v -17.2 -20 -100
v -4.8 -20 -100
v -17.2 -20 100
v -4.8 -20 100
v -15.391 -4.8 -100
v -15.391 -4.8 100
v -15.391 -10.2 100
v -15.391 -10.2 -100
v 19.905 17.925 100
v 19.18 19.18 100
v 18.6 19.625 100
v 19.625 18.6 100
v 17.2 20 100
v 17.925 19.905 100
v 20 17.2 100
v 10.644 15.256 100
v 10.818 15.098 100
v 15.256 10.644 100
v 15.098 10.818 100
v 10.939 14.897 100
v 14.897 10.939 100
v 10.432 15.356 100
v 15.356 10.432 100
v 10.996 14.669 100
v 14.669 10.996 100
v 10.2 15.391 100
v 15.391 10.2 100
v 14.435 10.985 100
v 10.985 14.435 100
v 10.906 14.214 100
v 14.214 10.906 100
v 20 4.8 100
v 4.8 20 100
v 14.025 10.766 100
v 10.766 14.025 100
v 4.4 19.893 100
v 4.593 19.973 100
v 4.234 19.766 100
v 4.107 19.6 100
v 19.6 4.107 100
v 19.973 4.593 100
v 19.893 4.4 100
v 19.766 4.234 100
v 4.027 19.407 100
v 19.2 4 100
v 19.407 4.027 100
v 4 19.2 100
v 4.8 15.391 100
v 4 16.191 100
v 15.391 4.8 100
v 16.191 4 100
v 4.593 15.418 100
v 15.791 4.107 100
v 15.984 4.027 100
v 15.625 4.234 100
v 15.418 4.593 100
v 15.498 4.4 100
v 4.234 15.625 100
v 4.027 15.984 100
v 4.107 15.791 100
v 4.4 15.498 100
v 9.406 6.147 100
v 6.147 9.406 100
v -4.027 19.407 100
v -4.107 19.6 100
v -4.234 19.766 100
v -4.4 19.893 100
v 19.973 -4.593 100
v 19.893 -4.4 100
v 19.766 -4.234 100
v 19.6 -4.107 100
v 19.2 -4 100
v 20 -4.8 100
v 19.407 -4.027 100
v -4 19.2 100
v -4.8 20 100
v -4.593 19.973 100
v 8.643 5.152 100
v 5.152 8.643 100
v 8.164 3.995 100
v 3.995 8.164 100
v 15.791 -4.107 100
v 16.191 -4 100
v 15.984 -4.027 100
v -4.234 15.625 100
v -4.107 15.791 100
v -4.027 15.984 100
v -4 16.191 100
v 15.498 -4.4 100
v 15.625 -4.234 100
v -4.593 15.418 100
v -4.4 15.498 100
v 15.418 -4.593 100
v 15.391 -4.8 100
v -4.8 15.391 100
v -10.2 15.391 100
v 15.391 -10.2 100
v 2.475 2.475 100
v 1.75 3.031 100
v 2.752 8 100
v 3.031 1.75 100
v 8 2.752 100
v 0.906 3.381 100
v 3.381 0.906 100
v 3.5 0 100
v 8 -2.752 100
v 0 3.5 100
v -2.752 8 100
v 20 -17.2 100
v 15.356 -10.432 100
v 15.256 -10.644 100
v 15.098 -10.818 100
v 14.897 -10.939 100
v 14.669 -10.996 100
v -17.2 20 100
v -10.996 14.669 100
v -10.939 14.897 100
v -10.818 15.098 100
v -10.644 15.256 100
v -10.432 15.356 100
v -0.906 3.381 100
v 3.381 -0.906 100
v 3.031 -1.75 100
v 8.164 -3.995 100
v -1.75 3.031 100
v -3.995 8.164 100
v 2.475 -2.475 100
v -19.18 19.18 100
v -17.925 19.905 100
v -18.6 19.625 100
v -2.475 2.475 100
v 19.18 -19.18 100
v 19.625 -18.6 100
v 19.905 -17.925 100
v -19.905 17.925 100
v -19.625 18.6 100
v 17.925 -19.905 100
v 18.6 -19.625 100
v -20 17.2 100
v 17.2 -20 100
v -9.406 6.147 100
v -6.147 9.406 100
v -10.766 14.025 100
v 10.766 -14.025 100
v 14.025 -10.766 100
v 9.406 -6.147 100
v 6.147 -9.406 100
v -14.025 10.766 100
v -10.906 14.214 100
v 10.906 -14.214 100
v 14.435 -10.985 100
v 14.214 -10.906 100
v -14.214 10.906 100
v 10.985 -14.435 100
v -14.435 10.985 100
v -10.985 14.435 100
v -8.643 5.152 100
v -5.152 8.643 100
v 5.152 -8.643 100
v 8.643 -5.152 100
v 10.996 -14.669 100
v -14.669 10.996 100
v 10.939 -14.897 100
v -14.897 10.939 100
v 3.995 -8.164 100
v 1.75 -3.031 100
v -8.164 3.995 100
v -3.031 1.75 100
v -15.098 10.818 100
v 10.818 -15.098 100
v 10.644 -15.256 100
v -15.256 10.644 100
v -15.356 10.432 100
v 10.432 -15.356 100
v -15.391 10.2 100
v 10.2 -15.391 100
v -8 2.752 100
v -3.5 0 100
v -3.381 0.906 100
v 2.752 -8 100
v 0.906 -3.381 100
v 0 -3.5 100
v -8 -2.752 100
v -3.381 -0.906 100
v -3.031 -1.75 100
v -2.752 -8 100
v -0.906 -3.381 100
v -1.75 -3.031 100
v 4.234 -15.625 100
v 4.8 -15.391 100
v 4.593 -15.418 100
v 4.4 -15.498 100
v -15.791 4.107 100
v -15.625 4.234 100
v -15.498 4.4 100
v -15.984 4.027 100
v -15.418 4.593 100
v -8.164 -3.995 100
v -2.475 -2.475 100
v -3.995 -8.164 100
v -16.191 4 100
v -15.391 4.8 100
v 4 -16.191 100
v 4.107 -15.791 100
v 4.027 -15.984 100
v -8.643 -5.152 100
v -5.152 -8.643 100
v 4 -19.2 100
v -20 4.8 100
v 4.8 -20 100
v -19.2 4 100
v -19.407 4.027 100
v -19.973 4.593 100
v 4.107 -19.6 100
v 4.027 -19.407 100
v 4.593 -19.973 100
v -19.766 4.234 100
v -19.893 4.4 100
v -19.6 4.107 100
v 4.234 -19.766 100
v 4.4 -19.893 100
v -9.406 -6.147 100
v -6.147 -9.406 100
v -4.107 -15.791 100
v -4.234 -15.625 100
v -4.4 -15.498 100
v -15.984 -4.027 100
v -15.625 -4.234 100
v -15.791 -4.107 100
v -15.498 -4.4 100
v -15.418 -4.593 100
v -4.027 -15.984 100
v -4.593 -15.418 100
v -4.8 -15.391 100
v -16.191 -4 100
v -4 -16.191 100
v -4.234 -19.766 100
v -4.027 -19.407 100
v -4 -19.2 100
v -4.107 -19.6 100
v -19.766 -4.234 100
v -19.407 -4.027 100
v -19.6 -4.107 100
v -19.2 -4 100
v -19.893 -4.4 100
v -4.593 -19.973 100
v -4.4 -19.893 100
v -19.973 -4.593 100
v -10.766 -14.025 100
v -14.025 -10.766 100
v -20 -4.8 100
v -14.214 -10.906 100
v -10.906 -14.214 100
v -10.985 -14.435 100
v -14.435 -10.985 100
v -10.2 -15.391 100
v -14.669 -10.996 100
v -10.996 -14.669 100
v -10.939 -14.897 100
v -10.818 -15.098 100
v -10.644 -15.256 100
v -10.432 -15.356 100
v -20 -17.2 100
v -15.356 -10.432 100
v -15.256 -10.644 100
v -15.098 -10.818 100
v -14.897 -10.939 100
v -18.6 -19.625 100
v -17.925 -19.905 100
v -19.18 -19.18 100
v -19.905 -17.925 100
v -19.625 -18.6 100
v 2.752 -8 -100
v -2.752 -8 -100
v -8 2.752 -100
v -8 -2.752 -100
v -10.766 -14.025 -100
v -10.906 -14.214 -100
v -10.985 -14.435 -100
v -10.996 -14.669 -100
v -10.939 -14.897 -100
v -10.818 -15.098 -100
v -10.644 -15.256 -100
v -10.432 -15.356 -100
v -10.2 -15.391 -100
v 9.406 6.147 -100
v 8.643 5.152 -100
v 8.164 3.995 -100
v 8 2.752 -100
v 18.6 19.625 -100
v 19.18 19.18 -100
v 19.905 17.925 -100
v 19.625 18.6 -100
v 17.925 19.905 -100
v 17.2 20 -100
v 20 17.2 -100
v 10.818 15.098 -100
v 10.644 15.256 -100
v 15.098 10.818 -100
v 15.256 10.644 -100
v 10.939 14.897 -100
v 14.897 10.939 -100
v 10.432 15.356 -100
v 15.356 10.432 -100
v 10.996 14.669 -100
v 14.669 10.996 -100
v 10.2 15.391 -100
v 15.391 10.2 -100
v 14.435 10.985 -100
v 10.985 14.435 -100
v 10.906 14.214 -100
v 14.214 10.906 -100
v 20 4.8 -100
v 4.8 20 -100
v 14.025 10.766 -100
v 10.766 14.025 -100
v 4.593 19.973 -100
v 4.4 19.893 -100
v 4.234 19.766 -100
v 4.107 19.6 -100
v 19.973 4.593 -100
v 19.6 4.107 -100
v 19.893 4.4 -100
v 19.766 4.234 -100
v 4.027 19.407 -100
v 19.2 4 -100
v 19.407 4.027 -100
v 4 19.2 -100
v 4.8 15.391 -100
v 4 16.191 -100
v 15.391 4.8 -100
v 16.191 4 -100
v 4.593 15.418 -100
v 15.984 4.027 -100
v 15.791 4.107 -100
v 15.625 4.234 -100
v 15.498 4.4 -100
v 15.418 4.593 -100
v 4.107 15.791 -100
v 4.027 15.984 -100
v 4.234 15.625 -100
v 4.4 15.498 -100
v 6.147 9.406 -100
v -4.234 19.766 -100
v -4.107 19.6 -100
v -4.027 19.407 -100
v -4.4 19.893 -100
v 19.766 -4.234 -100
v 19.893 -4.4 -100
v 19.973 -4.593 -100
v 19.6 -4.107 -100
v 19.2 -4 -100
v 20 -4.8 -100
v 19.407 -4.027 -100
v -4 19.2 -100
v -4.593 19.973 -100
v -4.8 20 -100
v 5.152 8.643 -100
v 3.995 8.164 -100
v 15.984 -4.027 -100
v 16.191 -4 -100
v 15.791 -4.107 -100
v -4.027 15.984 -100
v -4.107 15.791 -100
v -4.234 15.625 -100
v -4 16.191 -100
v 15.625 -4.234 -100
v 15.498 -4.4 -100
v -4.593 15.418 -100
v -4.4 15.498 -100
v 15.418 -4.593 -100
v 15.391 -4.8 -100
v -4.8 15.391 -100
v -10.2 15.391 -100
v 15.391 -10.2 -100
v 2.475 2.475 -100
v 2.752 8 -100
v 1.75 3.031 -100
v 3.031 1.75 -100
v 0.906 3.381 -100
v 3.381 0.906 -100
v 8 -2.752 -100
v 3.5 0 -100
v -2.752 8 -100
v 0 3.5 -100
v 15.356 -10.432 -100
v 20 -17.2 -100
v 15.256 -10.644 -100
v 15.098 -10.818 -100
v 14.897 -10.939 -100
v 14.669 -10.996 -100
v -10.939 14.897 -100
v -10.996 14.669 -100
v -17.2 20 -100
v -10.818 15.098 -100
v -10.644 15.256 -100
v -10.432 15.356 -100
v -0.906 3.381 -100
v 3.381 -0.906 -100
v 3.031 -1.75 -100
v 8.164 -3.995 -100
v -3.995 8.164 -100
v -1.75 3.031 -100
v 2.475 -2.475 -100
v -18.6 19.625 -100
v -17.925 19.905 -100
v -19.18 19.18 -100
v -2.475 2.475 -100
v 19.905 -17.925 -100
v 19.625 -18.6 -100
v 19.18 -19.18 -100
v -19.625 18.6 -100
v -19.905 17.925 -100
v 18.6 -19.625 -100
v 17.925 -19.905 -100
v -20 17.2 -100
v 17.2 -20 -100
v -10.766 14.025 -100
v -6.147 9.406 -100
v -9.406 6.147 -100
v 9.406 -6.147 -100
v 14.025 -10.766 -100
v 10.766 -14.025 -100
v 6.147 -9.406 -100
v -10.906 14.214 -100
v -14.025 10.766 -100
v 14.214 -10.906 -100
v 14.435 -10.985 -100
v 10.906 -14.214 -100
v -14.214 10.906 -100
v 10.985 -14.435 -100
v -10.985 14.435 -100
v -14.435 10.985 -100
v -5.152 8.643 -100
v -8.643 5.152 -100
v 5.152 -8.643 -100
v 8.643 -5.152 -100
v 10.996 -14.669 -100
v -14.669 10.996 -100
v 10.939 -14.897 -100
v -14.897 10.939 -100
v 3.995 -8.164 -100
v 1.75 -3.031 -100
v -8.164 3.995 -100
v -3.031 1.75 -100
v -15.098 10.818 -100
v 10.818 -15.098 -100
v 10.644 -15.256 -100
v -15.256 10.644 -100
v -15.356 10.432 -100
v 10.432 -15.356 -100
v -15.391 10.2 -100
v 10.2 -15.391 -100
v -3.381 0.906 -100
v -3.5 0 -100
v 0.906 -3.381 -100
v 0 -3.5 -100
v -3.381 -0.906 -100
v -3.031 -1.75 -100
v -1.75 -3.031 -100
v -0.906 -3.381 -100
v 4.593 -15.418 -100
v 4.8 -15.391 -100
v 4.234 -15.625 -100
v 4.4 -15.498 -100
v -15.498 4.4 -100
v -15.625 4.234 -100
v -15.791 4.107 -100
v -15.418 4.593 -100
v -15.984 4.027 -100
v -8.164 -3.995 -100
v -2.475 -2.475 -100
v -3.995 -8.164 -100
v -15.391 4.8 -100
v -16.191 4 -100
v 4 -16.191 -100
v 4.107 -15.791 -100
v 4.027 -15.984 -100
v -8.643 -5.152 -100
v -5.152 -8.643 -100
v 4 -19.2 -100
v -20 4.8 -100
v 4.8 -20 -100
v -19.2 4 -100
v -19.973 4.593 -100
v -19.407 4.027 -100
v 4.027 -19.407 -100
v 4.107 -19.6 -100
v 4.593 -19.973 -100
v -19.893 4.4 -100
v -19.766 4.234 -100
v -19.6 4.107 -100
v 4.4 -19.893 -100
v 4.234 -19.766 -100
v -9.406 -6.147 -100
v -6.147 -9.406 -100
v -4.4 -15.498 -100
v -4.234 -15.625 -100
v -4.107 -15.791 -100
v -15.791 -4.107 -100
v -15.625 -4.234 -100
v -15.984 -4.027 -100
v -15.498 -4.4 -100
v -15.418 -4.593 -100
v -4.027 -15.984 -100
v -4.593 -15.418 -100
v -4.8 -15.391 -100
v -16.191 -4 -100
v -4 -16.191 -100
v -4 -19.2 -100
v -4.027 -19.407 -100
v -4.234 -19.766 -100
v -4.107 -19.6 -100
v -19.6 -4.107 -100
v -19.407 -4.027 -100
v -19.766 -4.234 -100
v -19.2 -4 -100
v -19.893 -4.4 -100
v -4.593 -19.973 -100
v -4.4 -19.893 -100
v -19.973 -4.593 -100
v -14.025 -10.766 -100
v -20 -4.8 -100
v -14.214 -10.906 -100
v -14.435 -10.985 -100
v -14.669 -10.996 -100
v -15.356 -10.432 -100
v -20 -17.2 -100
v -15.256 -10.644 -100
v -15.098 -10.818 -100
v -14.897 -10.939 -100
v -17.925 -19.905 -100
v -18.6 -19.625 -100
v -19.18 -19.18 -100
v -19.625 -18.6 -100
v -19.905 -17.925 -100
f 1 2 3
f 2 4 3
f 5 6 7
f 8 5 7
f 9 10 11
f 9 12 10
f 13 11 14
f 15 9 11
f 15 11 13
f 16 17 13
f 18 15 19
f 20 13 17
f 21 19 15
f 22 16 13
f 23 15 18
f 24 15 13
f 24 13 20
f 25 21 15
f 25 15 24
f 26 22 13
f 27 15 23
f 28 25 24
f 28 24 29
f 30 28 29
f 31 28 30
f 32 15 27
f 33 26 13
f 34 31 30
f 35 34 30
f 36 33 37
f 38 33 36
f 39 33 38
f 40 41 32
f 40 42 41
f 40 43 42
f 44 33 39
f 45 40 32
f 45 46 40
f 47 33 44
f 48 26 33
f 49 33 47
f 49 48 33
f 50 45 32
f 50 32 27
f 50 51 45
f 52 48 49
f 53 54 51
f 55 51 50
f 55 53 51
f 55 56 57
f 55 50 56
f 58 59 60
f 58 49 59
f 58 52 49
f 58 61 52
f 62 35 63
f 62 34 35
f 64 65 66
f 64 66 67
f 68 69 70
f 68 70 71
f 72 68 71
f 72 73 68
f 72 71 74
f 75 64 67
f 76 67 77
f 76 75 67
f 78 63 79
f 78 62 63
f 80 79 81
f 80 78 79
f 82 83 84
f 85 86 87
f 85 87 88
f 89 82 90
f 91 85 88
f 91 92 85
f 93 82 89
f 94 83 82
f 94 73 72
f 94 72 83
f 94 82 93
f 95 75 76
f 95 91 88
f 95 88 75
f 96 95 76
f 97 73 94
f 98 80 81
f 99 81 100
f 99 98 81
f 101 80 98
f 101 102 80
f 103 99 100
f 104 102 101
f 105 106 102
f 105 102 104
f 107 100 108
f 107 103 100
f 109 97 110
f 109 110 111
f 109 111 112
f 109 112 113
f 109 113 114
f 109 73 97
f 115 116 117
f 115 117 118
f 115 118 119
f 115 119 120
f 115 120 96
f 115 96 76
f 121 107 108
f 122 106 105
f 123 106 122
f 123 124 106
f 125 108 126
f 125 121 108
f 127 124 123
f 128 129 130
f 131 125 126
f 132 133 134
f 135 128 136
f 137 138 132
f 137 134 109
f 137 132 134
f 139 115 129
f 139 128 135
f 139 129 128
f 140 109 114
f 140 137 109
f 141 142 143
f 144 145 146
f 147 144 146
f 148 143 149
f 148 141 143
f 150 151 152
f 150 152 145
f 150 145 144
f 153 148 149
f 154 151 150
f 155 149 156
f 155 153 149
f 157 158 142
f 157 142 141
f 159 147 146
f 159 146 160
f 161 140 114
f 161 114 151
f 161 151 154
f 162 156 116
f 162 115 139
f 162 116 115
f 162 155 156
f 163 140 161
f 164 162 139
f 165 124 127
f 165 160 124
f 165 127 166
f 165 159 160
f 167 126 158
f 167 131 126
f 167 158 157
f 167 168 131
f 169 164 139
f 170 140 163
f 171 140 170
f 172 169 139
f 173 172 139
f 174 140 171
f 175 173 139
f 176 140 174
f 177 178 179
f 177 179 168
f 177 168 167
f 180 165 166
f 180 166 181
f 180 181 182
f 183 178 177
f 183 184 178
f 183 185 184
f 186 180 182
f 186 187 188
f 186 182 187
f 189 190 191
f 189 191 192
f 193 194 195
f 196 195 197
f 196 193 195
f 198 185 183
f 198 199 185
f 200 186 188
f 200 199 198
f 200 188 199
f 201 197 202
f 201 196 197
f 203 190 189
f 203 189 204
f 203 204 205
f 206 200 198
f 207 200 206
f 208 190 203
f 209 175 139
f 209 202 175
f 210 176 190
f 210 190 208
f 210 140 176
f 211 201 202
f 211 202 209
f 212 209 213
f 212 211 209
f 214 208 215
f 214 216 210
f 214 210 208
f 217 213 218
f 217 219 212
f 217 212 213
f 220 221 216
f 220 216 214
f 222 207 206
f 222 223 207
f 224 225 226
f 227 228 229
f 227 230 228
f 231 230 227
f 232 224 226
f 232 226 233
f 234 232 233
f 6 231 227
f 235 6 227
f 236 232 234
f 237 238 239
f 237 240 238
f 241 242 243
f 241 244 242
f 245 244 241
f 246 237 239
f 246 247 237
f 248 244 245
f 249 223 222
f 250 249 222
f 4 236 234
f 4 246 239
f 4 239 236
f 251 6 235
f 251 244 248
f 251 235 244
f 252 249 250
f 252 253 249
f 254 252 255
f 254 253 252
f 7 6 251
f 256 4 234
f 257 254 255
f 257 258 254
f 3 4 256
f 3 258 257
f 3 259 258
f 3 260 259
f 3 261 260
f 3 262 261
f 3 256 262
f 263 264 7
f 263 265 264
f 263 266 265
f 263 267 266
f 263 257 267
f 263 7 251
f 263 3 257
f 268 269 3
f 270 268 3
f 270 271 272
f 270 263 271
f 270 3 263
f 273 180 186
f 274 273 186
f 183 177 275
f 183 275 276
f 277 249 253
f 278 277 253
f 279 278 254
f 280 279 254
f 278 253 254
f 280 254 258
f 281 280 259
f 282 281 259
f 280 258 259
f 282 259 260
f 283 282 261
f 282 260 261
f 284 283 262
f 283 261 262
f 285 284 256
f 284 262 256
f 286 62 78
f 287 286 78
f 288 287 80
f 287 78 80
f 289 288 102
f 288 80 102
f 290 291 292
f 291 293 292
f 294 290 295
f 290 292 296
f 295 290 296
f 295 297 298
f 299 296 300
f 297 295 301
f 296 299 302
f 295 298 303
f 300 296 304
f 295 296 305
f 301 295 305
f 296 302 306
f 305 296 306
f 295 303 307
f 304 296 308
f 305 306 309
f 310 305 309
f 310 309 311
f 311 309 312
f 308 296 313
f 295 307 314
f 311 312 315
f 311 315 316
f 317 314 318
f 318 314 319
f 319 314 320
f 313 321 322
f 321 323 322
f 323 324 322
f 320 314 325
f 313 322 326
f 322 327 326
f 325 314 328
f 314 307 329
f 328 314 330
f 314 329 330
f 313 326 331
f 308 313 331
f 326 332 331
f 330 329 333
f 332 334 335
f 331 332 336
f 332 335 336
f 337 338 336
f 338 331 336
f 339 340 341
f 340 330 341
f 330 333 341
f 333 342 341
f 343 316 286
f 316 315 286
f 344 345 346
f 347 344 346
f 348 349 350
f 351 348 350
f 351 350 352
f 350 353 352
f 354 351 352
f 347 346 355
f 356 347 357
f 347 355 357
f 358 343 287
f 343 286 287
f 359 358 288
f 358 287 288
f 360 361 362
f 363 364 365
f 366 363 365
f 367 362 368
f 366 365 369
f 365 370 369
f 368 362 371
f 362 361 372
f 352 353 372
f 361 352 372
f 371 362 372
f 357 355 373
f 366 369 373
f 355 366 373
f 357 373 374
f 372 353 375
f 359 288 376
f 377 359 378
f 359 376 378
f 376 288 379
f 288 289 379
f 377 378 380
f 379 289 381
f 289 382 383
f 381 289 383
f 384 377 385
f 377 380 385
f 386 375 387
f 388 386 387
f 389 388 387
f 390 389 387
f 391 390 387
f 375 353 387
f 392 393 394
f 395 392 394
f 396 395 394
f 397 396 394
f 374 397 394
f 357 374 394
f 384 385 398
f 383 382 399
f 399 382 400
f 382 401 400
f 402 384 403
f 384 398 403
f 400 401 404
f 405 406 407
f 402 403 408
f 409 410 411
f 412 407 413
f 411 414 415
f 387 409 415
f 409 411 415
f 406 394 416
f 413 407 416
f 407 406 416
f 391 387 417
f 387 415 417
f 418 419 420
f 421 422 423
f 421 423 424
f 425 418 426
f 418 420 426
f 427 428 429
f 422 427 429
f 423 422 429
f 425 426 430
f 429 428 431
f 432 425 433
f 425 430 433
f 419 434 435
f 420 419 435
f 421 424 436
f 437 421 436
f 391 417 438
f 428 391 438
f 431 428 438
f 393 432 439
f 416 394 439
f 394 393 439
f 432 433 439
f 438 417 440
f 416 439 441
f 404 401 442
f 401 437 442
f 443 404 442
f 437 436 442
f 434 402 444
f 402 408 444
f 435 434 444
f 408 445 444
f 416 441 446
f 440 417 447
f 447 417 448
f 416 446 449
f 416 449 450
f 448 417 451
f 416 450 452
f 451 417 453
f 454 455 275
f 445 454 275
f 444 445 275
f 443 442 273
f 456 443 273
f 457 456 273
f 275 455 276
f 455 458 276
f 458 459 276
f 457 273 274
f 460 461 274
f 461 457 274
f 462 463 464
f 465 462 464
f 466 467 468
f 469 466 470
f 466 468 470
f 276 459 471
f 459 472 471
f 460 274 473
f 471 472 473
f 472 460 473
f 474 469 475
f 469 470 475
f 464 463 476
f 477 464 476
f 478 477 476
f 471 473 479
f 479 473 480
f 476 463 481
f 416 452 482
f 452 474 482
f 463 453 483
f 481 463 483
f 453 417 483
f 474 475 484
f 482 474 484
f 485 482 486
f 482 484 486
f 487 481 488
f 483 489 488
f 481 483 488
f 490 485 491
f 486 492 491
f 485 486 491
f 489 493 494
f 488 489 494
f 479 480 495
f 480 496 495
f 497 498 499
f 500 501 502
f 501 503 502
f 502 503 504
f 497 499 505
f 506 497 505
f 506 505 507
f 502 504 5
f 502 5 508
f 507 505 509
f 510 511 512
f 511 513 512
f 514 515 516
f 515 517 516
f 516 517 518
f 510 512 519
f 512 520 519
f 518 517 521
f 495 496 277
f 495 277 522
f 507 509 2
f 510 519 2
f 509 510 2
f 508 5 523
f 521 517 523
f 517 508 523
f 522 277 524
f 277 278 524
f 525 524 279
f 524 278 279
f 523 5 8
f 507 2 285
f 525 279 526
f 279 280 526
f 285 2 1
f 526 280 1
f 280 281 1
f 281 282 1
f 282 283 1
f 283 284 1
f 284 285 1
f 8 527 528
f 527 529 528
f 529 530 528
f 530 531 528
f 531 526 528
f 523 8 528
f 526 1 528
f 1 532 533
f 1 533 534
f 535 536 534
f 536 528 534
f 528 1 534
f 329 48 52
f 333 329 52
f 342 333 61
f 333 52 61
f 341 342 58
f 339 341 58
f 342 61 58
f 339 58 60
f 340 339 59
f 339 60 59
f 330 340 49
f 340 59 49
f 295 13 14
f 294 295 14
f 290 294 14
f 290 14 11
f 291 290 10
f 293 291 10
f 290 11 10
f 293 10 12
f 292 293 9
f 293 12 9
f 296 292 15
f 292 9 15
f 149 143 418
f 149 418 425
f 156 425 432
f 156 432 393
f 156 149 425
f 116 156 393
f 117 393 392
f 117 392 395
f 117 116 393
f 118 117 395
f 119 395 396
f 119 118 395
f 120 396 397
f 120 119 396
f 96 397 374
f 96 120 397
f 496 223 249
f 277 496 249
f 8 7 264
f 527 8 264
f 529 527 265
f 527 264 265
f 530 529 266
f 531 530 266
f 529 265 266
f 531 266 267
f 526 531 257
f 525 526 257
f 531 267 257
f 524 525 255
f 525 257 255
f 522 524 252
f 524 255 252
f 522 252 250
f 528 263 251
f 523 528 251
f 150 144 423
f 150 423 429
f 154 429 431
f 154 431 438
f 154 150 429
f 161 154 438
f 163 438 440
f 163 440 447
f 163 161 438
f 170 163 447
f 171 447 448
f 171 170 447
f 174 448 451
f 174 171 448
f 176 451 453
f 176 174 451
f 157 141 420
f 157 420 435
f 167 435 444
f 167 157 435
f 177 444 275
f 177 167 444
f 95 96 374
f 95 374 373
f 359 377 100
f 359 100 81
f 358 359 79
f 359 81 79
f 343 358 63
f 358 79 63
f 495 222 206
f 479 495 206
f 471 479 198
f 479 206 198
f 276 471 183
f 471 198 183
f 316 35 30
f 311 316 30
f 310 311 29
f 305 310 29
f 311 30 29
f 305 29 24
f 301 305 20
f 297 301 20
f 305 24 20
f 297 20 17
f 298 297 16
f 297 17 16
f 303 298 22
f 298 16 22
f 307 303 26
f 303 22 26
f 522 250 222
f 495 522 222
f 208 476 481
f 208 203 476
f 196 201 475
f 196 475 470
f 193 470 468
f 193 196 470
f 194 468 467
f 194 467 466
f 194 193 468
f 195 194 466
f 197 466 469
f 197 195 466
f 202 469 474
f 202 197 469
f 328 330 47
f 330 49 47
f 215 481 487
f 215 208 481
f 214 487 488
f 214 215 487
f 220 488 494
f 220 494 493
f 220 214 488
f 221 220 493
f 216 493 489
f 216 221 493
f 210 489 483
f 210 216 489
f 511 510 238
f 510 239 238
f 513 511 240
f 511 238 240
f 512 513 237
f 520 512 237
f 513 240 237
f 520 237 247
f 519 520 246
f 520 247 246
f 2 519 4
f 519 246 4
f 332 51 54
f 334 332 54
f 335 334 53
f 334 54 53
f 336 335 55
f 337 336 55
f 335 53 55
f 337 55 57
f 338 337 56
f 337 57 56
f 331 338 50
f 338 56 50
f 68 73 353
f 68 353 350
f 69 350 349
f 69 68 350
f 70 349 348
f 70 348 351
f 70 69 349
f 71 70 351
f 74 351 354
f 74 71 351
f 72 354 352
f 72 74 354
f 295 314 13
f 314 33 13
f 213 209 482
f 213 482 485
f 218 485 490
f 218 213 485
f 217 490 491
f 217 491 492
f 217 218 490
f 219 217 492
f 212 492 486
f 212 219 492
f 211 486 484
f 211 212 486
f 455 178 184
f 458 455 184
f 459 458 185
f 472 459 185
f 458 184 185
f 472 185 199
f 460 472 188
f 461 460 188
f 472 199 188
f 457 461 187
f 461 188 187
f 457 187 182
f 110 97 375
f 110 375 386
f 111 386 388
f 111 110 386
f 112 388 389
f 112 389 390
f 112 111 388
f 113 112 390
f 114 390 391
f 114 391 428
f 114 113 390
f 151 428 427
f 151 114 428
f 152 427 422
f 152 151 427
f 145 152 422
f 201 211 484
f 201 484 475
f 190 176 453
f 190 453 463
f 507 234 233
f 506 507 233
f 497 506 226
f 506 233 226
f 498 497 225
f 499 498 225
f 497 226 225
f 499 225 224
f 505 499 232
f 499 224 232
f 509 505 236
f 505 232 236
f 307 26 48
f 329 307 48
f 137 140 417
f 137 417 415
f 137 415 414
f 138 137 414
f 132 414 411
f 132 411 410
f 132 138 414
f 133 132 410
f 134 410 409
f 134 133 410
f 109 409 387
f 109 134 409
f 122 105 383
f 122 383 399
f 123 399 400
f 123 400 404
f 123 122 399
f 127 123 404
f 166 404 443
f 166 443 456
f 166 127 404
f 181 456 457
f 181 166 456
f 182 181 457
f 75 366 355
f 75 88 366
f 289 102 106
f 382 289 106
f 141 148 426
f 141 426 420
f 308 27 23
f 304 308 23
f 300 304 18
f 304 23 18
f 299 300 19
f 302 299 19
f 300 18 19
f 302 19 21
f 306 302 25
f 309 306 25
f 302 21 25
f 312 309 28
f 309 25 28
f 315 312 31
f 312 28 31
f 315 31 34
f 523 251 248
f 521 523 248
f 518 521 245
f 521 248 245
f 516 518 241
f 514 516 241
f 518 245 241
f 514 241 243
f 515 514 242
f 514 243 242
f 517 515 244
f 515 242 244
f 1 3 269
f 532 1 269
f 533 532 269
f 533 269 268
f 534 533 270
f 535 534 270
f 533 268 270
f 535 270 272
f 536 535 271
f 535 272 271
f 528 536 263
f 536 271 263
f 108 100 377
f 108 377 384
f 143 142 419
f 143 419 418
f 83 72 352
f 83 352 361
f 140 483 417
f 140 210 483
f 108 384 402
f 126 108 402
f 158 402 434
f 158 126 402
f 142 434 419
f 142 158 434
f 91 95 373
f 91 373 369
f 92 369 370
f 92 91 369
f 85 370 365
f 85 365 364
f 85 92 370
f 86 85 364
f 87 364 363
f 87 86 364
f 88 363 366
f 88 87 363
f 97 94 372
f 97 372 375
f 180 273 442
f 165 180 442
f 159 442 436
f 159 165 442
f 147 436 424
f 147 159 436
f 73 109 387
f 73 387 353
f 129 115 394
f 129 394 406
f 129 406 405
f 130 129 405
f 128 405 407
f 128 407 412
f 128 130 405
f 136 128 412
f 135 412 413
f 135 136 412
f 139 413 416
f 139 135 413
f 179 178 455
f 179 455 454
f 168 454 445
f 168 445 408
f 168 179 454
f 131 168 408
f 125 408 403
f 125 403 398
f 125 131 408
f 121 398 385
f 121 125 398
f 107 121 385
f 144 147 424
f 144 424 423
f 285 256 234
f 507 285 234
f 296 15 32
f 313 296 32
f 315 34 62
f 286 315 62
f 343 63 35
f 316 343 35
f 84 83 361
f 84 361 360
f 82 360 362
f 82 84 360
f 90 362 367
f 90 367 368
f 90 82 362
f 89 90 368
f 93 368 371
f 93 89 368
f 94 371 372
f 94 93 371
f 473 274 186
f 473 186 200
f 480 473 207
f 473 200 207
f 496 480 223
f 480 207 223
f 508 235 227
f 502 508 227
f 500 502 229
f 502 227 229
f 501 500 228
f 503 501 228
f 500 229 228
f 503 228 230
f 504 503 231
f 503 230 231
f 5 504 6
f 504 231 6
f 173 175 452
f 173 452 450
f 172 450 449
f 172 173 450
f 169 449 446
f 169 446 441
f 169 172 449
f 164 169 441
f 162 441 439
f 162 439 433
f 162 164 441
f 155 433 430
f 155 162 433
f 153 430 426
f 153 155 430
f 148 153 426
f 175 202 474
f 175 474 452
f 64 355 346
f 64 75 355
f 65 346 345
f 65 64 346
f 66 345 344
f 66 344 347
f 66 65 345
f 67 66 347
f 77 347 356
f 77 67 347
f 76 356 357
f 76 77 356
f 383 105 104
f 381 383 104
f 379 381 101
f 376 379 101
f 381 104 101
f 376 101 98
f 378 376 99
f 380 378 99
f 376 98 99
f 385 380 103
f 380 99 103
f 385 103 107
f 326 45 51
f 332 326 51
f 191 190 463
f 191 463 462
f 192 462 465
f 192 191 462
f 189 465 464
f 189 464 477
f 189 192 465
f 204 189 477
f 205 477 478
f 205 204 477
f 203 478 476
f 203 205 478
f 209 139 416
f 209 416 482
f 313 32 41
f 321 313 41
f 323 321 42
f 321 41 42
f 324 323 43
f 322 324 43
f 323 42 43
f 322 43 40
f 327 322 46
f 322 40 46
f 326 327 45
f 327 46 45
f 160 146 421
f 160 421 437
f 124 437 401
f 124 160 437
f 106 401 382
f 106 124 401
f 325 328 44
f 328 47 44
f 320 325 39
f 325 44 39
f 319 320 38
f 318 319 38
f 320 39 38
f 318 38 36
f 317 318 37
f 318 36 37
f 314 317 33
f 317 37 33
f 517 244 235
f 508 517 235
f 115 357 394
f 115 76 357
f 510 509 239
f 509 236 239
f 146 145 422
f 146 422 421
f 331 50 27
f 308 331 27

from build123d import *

# Parameters (mm, degrees)
BOSS_EXTRUDE1_DEPTH = 100


with BuildPart() as part:
    # Sketch4 → Boss-Extrude1 (new body, symmetric)
    with BuildSketch(Plane.XY):
        with BuildLine():
            Line((4.8, -20), (17.2, -20))
            ThreePointArc((17.2, -20), (19.179898987, -19.179898987), (20, -17.2))
            Line((20, -17.2), (20, -4.8))
            ThreePointArc((20, -4.8), (19.765685425, -4.234314575), (19.2, -4))
            Line((19.2, -4), (16.190663761, -4))
            ThreePointArc((16.190663761, -4), (15.624978336, -4.234314575), (15.390663761, -4.8))
            Line((15.390663761, -4.8), (15.390663761, -10.2))
            ThreePointArc((15.390663761, -10.2), (14.896810507, -10.939103626), (14.024978336, -10.765685425))
            Line((14.024978336, -10.765685425), (9.40588745, -6.146594539))
            ThreePointArc((9.40588745, -6.146594539), (8.365378244, -4.589362465), (8, -2.752481989))
            Line((8, -2.752481989), (8, 0))
            Line((8, 0), (3.5, 0))
            ThreePointArc((3.5, 0), (2.474873734, -2.474873734), (0, -3.5))
            Line((0, -3.5), (0, -8))
            Line((0, -8), (2.752481989, -8))
            ThreePointArc((2.752481989, -8), (4.589362465, -8.365378244), (6.146594539, -9.40588745))
            Line((6.146594539, -9.40588745), (10.765685425, -14.024978336))
            ThreePointArc((10.765685425, -14.024978336), (10.939103626, -14.896810507), (10.2, -15.390663761))
            Line((10.2, -15.390663761), (4.8, -15.390663761))
            ThreePointArc((4.8, -15.390663761), (4.234314575, -15.624978336), (4, -16.190663761))
            Line((4, -16.190663761), (4, -19.2))
            ThreePointArc((4, -19.2), (4.234314575, -19.765685425), (4.8, -20))
        make_face()
    extrude(amount=BOSS_EXTRUDE1_DEPTH, both=True)

    # Mirror1: part across plane


with BuildPart() as part_1:
    add(part.part)
    add(part.part.mirror(Plane(origin=(0, 0, 0), x_dir=(0, 0, 1), z_dir=(1, 0, 0))))

    # Mirror2: part across plane


with BuildPart() as part_2:
    add(part_1.part)
    add(part_1.part.mirror(Plane.ZX))


solid = part_2.part
